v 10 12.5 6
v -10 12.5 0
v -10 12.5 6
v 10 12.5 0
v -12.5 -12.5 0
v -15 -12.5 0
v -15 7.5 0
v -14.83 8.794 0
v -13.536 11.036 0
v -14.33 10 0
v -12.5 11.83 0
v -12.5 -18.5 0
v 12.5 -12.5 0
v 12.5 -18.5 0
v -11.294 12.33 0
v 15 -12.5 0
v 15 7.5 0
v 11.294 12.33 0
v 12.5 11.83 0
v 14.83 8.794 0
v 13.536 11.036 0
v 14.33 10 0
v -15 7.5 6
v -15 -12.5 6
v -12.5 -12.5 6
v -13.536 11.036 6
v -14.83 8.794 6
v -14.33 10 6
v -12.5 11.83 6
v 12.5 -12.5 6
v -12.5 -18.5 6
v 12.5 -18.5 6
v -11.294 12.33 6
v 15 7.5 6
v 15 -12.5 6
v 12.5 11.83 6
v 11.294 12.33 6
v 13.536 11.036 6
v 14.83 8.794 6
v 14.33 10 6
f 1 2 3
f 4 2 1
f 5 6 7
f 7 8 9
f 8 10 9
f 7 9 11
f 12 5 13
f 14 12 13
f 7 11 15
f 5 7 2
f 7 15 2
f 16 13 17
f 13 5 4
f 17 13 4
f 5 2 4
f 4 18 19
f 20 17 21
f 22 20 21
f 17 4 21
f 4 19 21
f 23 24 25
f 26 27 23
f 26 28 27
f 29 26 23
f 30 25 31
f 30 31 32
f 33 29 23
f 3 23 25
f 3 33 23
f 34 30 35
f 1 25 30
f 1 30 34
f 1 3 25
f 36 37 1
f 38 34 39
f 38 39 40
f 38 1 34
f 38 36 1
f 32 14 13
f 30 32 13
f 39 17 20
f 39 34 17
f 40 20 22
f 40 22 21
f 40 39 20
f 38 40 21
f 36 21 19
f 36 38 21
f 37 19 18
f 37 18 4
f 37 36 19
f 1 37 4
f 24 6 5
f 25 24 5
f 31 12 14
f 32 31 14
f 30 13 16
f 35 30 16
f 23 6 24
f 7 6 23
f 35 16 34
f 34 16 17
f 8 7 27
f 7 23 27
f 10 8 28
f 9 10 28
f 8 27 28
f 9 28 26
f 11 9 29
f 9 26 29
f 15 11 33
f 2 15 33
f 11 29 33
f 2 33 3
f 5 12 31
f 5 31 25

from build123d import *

# Parameters (mm, degrees)
ESBO_O1_W                = 30
ESBO_O1_H                = 25
ESBO_O1_W_2              = 25
ESBO_O1_H_2              = 6
RESSALTO_EXTRUS_O1_DEPTH = 6
FILETE1_R                = 5


with BuildPart() as part:
    # Esboço1 → Ressalto-extrusão1 (new body)
    with BuildSketch(Plane.XY):
        Rectangle(ESBO_O1_W, ESBO_O1_H)
        with Locations((0, -15.5)):
            Rectangle(ESBO_O1_W_2, ESBO_O1_H_2)
    extrude(amount=RESSALTO_EXTRUS_O1_DEPTH)

    # Filete1
    filete1_edges = [part.edges().sort_by_distance(p)[0] for p in [
        (-15, 12.5, 3),
        (15, 12.5, 3),
    ]]
    fillet(filete1_edges, radius=FILETE1_R)


solid = part.part
